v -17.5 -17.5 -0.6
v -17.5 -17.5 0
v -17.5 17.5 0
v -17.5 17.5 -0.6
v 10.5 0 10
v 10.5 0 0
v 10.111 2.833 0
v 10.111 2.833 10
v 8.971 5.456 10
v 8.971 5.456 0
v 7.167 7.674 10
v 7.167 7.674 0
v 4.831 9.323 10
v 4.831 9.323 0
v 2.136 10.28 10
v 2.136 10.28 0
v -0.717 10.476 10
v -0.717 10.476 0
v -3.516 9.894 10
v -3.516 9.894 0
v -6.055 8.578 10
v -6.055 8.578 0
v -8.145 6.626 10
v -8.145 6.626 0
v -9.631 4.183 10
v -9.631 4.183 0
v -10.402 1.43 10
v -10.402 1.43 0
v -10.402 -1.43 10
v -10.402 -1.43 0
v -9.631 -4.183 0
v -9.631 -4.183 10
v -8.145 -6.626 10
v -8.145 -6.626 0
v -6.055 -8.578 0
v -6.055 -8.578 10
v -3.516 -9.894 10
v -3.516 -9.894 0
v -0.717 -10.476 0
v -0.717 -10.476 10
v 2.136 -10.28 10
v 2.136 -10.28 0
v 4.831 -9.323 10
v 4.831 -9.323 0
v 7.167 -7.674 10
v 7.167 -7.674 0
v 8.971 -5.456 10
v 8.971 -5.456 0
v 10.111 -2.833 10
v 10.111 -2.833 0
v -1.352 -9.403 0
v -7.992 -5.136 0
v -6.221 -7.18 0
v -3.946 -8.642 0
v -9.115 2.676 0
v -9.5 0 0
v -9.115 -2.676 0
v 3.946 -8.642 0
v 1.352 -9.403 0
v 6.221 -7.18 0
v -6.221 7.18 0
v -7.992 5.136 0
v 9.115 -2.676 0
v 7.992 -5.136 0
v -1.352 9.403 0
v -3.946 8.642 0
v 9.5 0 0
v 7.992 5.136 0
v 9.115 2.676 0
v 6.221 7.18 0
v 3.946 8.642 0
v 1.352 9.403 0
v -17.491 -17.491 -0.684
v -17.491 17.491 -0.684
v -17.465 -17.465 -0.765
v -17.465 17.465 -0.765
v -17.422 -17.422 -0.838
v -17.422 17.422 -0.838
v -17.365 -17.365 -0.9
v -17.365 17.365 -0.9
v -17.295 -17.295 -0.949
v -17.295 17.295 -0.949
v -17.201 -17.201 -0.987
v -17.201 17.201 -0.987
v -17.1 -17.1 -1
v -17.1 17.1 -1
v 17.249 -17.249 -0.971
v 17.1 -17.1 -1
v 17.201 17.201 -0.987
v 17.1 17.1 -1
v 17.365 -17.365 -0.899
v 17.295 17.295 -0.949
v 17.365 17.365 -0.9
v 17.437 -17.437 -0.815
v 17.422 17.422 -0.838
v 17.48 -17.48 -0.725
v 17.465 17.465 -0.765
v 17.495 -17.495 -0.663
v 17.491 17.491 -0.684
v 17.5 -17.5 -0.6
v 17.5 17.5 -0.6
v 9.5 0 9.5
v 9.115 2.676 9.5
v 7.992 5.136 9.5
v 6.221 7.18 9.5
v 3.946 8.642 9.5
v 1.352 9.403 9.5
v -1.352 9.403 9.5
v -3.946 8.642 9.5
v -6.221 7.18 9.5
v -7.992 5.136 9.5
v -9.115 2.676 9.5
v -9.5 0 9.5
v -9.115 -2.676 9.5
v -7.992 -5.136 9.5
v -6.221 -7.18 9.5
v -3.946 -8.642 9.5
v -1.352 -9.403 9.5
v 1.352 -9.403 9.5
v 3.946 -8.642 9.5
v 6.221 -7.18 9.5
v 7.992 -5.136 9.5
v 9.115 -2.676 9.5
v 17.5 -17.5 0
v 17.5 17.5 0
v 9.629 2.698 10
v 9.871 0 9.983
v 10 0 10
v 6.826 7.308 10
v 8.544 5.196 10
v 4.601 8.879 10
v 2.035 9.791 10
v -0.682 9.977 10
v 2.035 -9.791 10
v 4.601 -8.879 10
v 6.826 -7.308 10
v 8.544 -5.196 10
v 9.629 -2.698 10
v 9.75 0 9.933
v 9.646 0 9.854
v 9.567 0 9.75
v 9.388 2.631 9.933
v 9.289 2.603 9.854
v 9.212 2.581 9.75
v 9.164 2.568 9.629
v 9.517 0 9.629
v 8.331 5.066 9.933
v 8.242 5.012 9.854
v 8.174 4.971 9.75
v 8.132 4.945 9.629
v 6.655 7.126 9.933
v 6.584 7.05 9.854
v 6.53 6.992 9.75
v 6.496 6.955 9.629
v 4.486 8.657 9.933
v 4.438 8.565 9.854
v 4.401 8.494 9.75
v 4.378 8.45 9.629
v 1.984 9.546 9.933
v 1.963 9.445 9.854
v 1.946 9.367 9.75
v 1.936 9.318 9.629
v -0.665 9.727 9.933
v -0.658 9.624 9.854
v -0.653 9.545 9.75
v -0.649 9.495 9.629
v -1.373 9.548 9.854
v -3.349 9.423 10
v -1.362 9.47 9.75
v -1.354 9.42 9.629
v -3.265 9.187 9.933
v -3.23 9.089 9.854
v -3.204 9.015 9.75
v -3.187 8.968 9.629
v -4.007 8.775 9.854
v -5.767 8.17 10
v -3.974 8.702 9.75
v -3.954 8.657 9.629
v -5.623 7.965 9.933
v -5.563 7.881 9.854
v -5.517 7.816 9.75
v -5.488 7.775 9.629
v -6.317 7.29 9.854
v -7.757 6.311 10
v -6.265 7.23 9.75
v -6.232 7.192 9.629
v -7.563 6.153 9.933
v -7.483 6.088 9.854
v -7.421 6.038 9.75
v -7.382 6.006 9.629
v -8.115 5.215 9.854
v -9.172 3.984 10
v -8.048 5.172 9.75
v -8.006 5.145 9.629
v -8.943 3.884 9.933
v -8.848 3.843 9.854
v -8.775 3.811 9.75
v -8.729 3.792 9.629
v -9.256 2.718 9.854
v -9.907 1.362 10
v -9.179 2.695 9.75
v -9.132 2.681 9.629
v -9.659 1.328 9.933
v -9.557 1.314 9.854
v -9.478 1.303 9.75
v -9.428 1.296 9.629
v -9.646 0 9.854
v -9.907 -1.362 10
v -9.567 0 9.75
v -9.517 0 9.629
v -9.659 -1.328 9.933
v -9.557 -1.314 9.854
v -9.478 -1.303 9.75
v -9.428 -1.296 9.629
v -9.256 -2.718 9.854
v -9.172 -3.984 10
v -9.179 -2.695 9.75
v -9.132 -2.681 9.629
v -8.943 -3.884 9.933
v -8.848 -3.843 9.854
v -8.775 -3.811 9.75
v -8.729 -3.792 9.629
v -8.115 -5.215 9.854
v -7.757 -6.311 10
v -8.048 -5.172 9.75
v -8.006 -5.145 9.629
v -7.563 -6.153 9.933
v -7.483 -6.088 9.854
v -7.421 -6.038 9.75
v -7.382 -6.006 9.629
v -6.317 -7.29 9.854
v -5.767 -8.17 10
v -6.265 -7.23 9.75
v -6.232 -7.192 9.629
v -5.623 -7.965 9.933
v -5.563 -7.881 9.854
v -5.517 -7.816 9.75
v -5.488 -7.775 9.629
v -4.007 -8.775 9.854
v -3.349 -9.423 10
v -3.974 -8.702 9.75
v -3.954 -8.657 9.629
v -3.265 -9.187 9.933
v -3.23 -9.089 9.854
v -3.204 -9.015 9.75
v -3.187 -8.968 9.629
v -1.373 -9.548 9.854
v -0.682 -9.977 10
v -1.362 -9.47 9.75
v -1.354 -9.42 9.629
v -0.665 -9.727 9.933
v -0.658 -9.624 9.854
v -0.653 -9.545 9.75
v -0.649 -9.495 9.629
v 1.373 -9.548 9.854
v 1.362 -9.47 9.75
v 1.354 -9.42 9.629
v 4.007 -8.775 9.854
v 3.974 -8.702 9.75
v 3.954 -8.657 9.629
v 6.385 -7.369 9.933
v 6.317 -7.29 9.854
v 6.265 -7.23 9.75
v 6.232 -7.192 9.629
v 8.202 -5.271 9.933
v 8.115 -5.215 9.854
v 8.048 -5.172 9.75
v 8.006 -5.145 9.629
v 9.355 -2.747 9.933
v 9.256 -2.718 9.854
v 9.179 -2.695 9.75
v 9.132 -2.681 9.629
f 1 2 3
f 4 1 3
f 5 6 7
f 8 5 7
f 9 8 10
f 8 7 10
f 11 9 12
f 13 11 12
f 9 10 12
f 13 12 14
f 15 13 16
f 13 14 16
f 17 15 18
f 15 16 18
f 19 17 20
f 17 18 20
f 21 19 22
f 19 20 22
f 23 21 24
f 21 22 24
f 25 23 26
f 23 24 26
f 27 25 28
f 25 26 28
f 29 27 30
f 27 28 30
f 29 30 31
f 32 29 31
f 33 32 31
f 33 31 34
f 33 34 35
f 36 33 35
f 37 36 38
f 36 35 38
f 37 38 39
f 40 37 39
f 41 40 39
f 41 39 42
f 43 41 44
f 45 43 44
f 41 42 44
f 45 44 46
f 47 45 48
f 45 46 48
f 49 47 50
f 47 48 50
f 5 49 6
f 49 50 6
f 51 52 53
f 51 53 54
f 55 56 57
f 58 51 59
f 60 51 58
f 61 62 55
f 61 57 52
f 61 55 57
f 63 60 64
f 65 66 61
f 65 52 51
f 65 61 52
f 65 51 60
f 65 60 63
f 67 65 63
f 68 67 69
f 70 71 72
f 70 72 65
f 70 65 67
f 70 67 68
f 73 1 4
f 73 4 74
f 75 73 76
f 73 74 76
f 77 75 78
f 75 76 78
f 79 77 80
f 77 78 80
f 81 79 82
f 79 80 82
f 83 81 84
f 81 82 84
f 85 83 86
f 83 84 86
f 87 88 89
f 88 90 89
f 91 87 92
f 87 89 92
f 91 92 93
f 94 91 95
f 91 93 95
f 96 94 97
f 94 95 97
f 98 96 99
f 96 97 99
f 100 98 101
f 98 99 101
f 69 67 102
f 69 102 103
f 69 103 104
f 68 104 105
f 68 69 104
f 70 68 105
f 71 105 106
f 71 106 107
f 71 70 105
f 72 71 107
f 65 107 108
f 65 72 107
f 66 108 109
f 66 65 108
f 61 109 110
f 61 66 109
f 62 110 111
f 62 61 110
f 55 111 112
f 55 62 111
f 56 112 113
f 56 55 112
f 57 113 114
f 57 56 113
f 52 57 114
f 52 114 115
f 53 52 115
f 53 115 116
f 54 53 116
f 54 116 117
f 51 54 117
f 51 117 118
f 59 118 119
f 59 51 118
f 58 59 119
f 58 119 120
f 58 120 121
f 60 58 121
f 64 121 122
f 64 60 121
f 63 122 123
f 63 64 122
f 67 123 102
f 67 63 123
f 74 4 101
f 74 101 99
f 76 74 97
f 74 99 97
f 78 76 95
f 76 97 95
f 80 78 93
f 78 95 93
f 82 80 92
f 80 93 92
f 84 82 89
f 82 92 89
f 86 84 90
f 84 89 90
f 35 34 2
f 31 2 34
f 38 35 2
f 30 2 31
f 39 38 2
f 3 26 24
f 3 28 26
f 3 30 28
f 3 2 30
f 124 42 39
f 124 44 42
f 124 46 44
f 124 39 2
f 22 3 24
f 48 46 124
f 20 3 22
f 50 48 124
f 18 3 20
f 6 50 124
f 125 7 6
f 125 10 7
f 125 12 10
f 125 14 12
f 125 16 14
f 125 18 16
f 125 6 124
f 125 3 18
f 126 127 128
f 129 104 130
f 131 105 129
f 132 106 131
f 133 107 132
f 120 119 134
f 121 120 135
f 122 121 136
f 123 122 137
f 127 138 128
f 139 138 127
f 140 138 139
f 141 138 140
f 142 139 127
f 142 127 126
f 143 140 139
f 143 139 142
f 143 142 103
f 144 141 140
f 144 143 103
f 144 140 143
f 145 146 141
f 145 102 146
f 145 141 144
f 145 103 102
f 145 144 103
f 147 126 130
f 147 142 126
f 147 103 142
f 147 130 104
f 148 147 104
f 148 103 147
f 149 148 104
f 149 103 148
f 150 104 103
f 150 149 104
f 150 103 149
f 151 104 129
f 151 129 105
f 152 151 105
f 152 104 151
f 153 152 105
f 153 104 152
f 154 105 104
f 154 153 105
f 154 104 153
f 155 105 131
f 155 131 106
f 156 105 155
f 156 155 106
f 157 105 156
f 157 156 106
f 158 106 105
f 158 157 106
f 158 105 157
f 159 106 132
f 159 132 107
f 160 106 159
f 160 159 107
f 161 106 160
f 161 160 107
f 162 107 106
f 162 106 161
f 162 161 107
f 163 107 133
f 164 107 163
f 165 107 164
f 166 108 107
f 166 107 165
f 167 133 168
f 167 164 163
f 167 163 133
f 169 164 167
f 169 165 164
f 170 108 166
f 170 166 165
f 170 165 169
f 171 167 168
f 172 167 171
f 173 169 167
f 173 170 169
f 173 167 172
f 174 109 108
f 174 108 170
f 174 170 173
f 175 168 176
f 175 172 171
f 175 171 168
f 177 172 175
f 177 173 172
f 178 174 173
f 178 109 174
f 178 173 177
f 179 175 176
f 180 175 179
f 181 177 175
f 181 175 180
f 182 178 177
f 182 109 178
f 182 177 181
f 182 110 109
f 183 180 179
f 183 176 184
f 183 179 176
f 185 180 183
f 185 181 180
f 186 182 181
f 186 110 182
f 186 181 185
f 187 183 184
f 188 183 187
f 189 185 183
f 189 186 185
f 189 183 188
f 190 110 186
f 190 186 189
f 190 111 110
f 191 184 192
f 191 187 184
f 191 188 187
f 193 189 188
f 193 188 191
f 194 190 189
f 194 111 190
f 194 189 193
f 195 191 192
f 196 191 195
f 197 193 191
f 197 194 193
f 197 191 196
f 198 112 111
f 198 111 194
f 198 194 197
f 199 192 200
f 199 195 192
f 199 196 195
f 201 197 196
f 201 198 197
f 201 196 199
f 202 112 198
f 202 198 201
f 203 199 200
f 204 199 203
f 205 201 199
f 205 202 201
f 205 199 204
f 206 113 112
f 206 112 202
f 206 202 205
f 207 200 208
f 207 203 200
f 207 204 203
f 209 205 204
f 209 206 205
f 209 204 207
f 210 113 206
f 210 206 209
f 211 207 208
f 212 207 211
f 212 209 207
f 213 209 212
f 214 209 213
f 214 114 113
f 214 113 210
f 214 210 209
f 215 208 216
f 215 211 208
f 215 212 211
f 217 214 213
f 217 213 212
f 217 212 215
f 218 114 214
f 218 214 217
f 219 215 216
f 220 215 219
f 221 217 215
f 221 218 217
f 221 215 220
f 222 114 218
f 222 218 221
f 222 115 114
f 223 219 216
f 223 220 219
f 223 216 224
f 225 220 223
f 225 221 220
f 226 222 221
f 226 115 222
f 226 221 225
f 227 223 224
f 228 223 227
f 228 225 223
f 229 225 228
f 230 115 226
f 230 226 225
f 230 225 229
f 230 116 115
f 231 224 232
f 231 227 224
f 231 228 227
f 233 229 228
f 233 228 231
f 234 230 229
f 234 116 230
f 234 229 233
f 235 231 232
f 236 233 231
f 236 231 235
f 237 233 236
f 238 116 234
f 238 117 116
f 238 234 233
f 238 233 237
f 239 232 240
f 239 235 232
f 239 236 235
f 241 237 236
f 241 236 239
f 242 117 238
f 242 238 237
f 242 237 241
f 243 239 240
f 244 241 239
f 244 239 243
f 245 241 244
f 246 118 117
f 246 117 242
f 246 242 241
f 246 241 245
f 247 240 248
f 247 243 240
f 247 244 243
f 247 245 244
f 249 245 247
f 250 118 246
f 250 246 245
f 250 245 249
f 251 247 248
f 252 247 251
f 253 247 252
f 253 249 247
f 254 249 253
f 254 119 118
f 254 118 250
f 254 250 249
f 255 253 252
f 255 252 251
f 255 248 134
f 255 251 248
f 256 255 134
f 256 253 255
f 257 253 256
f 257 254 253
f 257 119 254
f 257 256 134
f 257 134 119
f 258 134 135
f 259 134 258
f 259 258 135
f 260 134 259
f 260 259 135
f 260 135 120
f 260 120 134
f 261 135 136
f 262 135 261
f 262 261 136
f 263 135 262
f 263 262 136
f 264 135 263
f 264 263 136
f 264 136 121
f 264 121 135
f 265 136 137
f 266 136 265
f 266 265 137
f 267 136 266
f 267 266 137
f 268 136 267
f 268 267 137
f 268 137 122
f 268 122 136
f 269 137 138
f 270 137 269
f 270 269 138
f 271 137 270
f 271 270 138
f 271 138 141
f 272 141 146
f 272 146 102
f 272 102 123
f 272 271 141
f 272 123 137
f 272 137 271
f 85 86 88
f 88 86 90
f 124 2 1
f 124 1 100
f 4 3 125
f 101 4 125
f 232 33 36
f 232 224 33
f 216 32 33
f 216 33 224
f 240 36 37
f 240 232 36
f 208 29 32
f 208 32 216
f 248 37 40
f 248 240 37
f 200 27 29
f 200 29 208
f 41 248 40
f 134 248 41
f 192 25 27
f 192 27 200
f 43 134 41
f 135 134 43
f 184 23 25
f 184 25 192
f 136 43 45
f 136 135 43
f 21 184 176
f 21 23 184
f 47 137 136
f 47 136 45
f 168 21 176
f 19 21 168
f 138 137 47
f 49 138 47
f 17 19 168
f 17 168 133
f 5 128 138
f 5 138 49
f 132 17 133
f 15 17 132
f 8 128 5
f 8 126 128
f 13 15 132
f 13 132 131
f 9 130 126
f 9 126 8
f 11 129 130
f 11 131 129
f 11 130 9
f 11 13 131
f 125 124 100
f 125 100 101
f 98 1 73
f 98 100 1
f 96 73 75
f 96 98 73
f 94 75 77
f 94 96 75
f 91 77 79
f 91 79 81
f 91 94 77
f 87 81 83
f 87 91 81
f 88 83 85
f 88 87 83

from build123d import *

# Parameters (mm, degrees)
F0_R     = 10.5
F0_R_2   = 9.5
F1_DEPTH = 10
F0_W     = 35
F0_H     = 35
F2_DEPTH = 1
F3_R     = 0.4
F4_R     = 0.5


with BuildPart() as f1:
    # F0 (on Top) → F1 (new body)
    with BuildSketch(Plane.XY):
        Circle(F0_R)
        Circle(F0_R_2, mode=Mode.SUBTRACT)
    extrude(amount=F1_DEPTH)

    # F0 (on Top) → F2 (join)
    with BuildSketch(Plane.XY):
        Rectangle(F0_W, F0_H)
        Circle(F0_R, mode=Mode.SUBTRACT)
        Circle(F0_R)
        Circle(F0_R_2, mode=Mode.SUBTRACT)
        Circle(F0_R_2)
    extrude(amount=-F2_DEPTH)

    # F3
    f3_edges = [f1.edges().sort_by_distance(p)[0] for p in [
        (-17.5, 0, -1),
        (0, 17.5, -1),
        (17.5, 0, -1),
        (0, -17.5, -1),
    ]]
    fillet(f3_edges, radius=F3_R)

    # F4
    f4_edges = [f1.edges().sort_by_distance(p)[0] for p in [
        (-9.5, 0, 10),
    ]]
    fillet(f4_edges, radius=F4_R)


solid = f1.part
